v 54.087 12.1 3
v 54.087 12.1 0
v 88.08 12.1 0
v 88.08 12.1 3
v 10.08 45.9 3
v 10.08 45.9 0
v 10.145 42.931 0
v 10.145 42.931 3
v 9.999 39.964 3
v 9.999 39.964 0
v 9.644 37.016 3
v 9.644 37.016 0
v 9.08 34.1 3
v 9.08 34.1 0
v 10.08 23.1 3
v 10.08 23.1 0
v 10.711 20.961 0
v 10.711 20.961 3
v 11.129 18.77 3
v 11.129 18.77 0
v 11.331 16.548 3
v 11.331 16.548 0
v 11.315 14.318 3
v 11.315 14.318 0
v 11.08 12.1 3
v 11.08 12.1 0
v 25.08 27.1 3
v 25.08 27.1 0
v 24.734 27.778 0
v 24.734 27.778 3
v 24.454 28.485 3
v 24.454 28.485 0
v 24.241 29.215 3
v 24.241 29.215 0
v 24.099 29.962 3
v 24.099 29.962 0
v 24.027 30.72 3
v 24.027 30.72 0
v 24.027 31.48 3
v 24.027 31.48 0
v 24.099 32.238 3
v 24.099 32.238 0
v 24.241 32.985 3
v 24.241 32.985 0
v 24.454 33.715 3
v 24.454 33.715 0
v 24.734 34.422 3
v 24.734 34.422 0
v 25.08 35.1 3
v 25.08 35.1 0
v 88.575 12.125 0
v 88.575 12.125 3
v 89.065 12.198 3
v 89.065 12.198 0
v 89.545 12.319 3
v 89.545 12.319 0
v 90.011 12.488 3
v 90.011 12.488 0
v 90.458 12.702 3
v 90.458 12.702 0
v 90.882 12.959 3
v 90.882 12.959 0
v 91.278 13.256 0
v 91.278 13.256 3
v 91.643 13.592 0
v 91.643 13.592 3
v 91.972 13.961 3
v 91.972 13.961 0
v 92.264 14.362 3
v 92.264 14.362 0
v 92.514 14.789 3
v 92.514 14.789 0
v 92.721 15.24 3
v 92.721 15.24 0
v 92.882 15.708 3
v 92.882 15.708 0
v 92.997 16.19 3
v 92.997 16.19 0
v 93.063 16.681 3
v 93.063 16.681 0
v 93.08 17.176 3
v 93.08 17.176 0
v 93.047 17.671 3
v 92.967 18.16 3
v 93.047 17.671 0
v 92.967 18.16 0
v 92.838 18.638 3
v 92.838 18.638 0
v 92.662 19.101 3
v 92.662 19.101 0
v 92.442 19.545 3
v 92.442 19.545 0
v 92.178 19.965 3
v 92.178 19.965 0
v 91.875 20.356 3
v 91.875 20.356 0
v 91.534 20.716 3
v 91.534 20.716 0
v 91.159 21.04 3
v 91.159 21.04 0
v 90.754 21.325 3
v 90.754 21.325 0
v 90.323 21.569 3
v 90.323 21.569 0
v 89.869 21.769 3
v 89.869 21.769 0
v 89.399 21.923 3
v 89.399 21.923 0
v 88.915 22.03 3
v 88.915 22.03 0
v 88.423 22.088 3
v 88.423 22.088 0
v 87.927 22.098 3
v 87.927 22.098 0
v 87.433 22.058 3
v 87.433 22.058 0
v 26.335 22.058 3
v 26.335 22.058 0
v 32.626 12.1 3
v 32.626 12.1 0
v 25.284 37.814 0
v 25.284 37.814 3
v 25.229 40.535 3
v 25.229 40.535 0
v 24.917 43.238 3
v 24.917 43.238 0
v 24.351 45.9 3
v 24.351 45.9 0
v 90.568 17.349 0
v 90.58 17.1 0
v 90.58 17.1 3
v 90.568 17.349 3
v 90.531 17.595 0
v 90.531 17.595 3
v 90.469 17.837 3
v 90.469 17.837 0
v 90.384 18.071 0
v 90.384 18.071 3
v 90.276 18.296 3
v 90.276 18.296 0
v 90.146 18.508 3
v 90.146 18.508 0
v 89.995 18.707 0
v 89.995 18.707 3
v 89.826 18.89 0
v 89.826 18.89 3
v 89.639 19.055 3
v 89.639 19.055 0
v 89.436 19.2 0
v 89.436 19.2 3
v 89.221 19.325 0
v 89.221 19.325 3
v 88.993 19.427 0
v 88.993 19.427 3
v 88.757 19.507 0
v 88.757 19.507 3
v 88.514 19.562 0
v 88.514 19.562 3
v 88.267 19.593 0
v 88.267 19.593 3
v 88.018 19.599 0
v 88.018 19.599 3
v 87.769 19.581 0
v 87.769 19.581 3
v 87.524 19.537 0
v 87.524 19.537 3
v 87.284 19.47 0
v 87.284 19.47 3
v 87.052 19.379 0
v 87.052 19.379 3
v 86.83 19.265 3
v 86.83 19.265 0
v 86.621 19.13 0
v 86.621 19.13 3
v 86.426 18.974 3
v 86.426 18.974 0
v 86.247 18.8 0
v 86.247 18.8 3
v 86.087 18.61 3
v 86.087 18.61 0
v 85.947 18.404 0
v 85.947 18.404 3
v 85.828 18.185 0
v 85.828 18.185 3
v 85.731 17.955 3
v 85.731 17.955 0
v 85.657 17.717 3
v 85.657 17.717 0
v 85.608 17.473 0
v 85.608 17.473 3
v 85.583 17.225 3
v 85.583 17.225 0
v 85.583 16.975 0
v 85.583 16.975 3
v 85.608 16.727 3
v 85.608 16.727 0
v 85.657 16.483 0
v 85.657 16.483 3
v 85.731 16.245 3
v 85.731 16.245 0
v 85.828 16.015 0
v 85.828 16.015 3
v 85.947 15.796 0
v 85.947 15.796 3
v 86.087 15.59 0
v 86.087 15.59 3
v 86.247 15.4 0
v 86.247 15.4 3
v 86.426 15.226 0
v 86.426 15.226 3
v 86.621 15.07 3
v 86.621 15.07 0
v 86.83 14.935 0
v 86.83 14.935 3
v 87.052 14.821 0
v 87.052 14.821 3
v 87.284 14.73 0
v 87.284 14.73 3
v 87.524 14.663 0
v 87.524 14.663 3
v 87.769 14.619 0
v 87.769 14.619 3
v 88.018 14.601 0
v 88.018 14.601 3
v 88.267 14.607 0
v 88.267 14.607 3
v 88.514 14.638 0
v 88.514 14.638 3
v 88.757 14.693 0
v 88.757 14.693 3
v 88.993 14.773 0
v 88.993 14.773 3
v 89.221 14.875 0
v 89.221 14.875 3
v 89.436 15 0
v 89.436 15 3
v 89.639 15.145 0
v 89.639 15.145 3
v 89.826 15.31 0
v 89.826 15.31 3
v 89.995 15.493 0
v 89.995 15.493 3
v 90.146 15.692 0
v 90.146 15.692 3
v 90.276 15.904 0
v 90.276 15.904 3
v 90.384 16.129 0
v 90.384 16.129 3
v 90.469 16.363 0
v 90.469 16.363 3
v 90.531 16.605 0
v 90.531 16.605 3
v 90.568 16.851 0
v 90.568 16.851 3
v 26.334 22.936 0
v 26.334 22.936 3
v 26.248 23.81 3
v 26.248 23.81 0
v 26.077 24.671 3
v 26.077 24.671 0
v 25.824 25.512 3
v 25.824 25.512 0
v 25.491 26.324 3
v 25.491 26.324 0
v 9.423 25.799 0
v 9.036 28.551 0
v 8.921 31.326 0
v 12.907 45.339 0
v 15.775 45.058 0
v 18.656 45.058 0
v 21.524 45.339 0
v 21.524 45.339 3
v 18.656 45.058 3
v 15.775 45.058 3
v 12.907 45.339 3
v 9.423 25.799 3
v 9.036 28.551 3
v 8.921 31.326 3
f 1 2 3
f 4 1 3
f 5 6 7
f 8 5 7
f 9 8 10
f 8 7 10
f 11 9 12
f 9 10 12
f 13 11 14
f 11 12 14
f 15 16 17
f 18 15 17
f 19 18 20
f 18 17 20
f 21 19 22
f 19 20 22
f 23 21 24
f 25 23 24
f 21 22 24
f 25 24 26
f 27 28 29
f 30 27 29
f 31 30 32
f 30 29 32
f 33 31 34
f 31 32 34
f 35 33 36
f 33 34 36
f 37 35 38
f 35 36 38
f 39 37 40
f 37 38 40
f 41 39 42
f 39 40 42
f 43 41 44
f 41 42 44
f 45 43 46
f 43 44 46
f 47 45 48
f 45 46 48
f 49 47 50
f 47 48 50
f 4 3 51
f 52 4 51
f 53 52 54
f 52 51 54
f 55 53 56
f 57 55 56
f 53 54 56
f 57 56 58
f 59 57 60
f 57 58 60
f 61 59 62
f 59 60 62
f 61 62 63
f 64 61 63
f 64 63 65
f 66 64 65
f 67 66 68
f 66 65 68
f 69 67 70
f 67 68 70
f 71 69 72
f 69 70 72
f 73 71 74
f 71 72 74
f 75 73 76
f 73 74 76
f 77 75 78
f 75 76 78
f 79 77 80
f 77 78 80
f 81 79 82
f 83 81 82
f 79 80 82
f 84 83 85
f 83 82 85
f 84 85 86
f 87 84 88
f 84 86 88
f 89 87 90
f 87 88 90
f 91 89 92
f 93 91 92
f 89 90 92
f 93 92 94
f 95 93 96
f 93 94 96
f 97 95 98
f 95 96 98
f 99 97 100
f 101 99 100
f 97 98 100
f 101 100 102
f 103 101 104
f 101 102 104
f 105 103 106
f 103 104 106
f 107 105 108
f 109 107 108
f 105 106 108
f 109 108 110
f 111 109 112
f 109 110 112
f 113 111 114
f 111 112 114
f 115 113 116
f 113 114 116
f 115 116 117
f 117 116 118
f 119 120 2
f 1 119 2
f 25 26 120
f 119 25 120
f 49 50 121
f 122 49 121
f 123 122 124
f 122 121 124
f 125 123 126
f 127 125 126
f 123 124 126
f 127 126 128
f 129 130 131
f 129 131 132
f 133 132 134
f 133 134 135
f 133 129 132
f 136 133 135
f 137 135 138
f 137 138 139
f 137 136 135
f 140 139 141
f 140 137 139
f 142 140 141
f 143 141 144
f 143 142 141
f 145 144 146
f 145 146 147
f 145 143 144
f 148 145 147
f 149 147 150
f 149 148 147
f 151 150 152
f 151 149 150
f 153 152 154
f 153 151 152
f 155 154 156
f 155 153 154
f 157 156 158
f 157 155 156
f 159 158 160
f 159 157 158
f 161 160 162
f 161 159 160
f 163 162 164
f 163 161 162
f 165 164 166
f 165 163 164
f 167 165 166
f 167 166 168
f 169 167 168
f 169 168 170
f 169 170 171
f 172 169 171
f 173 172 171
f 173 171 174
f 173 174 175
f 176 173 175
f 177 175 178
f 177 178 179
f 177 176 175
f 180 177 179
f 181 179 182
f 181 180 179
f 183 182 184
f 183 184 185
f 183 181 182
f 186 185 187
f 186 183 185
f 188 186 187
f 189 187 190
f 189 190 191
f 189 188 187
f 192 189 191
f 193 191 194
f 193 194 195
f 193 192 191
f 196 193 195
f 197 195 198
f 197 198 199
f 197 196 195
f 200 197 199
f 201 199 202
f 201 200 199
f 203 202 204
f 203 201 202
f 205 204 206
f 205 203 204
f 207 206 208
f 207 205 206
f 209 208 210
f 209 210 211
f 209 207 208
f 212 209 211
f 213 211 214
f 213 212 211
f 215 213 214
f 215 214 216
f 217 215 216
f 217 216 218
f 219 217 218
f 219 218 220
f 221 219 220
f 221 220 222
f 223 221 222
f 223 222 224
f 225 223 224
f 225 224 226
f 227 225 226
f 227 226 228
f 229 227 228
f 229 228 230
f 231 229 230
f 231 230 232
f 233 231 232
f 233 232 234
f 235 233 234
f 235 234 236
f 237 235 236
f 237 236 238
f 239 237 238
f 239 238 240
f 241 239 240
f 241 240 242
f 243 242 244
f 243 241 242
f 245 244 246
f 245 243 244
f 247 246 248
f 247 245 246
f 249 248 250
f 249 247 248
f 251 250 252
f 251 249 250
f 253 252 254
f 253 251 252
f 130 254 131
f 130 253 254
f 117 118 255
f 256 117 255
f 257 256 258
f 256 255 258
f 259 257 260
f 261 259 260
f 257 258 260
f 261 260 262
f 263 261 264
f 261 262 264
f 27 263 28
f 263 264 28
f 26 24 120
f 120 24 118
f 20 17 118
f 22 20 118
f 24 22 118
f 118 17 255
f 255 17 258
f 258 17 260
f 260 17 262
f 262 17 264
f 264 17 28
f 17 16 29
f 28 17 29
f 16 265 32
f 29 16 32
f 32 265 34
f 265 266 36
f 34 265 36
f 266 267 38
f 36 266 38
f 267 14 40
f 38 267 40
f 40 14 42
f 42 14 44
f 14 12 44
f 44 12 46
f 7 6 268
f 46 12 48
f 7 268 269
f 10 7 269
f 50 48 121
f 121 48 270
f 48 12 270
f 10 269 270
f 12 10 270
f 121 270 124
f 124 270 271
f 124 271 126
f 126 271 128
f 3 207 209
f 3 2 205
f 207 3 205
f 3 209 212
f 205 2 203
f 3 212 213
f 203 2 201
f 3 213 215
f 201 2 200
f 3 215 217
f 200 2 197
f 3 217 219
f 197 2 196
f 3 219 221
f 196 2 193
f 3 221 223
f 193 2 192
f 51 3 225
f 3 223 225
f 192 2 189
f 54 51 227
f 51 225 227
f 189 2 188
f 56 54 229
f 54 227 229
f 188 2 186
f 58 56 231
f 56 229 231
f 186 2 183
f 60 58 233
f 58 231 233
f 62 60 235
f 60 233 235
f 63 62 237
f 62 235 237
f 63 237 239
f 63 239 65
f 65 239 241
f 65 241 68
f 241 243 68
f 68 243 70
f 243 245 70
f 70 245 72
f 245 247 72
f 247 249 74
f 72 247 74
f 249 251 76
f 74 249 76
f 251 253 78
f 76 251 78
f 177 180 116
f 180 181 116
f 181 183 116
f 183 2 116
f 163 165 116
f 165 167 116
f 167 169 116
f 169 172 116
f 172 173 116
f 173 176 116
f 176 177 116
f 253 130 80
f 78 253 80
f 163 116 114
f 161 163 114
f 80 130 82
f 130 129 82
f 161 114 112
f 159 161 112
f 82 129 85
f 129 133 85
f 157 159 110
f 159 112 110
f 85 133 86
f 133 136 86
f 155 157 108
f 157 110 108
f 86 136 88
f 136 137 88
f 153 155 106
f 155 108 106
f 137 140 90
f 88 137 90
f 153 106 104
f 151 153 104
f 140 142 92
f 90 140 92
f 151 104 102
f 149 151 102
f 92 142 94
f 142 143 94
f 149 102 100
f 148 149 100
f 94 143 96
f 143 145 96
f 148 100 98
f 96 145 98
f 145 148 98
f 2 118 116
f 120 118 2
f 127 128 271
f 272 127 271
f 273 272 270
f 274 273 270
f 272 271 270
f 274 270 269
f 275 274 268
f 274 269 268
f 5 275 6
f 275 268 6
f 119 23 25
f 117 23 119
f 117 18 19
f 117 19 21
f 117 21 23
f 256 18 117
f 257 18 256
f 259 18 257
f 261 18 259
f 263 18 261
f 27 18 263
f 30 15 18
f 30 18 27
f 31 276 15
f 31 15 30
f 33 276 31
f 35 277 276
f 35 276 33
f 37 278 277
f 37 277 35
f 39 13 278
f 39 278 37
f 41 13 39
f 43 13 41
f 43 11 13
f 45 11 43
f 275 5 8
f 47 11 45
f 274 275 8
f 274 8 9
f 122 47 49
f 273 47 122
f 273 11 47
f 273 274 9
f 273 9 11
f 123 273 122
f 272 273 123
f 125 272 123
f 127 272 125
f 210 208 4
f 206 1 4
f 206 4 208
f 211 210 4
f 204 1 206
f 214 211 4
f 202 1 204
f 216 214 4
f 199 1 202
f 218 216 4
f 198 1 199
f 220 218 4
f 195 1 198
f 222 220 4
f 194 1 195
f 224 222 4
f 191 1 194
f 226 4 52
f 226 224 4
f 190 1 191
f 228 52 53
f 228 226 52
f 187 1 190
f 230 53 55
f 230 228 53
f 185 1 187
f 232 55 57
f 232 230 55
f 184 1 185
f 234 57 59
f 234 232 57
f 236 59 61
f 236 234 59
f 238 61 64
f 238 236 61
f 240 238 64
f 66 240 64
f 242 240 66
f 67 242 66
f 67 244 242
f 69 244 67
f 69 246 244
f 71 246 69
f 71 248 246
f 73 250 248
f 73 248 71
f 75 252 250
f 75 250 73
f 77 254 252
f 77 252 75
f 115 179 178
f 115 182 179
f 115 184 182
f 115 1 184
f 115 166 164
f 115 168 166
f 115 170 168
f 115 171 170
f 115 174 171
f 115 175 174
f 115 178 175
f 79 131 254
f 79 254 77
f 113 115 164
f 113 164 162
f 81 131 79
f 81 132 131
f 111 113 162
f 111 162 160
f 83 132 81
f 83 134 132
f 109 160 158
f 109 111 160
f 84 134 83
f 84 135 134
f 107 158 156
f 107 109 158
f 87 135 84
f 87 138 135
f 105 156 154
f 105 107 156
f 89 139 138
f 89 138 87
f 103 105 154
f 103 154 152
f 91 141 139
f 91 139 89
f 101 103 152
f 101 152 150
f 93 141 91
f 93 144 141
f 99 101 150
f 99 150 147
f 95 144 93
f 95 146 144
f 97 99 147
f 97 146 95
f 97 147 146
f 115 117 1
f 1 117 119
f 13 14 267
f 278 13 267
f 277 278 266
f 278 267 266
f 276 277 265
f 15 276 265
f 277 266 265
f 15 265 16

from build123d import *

# Parameters (mm, degrees)
MODEL_R                 = 2.5
SALIENTE_EXTRUIR1_DEPTH = 3


with BuildPart() as part:
    # Model → Saliente-Extruir1 (new body)
    with BuildSketch(Plane.XY):
        with BuildLine():
            Line((11.080118073, 12.100032616), (32.626217211, 12.100005802))
            Line((32.626217211, 12.100005802), (54.087474295, 12.099999973))
            Line((54.087474295, 12.099999973), (88.080119434, 12.099990741))
            ThreePointArc((88.080119434, 12.099990741), (93.069612737, 17.423981681), (87.43349937, 22.058002513))
            Line((87.43349937, 22.058002513), (26.334882576, 22.058035741))
            ThreePointArc((26.334882576, 22.058035741), (26.077271745, 24.671051179), (25.080126231, 27.100025003))
            ThreePointArc((25.080126231, 27.100025003), (24.017870658, 31.10002558), (25.080130581, 35.100025003))
            ThreePointArc((25.080130581, 35.100025003), (25.229028906, 40.534712367), (24.350613381, 45.900006732))
            ThreePointArc((24.350613381, 45.900006732), (17.215374003, 45.022517475), (10.080135103, 45.900010617))
            ThreePointArc((10.080135103, 45.900010617), (9.999432675, 39.964488004), (9.080130038, 34.100033704))
            ThreePointArc((9.080130038, 34.100033704), (9.035519695, 28.550523972), (10.080124055, 23.10003316))
            ThreePointArc((10.080124055, 23.10003316), (11.257202039, 17.661585333), (11.080118073, 12.100032616))
        make_face()
        with Locations((88.080120792, 17.099990741)):
            Circle(MODEL_R, mode=Mode.SUBTRACT)
    extrude(amount=SALIENTE_EXTRUIR1_DEPTH)


solid = part.part
